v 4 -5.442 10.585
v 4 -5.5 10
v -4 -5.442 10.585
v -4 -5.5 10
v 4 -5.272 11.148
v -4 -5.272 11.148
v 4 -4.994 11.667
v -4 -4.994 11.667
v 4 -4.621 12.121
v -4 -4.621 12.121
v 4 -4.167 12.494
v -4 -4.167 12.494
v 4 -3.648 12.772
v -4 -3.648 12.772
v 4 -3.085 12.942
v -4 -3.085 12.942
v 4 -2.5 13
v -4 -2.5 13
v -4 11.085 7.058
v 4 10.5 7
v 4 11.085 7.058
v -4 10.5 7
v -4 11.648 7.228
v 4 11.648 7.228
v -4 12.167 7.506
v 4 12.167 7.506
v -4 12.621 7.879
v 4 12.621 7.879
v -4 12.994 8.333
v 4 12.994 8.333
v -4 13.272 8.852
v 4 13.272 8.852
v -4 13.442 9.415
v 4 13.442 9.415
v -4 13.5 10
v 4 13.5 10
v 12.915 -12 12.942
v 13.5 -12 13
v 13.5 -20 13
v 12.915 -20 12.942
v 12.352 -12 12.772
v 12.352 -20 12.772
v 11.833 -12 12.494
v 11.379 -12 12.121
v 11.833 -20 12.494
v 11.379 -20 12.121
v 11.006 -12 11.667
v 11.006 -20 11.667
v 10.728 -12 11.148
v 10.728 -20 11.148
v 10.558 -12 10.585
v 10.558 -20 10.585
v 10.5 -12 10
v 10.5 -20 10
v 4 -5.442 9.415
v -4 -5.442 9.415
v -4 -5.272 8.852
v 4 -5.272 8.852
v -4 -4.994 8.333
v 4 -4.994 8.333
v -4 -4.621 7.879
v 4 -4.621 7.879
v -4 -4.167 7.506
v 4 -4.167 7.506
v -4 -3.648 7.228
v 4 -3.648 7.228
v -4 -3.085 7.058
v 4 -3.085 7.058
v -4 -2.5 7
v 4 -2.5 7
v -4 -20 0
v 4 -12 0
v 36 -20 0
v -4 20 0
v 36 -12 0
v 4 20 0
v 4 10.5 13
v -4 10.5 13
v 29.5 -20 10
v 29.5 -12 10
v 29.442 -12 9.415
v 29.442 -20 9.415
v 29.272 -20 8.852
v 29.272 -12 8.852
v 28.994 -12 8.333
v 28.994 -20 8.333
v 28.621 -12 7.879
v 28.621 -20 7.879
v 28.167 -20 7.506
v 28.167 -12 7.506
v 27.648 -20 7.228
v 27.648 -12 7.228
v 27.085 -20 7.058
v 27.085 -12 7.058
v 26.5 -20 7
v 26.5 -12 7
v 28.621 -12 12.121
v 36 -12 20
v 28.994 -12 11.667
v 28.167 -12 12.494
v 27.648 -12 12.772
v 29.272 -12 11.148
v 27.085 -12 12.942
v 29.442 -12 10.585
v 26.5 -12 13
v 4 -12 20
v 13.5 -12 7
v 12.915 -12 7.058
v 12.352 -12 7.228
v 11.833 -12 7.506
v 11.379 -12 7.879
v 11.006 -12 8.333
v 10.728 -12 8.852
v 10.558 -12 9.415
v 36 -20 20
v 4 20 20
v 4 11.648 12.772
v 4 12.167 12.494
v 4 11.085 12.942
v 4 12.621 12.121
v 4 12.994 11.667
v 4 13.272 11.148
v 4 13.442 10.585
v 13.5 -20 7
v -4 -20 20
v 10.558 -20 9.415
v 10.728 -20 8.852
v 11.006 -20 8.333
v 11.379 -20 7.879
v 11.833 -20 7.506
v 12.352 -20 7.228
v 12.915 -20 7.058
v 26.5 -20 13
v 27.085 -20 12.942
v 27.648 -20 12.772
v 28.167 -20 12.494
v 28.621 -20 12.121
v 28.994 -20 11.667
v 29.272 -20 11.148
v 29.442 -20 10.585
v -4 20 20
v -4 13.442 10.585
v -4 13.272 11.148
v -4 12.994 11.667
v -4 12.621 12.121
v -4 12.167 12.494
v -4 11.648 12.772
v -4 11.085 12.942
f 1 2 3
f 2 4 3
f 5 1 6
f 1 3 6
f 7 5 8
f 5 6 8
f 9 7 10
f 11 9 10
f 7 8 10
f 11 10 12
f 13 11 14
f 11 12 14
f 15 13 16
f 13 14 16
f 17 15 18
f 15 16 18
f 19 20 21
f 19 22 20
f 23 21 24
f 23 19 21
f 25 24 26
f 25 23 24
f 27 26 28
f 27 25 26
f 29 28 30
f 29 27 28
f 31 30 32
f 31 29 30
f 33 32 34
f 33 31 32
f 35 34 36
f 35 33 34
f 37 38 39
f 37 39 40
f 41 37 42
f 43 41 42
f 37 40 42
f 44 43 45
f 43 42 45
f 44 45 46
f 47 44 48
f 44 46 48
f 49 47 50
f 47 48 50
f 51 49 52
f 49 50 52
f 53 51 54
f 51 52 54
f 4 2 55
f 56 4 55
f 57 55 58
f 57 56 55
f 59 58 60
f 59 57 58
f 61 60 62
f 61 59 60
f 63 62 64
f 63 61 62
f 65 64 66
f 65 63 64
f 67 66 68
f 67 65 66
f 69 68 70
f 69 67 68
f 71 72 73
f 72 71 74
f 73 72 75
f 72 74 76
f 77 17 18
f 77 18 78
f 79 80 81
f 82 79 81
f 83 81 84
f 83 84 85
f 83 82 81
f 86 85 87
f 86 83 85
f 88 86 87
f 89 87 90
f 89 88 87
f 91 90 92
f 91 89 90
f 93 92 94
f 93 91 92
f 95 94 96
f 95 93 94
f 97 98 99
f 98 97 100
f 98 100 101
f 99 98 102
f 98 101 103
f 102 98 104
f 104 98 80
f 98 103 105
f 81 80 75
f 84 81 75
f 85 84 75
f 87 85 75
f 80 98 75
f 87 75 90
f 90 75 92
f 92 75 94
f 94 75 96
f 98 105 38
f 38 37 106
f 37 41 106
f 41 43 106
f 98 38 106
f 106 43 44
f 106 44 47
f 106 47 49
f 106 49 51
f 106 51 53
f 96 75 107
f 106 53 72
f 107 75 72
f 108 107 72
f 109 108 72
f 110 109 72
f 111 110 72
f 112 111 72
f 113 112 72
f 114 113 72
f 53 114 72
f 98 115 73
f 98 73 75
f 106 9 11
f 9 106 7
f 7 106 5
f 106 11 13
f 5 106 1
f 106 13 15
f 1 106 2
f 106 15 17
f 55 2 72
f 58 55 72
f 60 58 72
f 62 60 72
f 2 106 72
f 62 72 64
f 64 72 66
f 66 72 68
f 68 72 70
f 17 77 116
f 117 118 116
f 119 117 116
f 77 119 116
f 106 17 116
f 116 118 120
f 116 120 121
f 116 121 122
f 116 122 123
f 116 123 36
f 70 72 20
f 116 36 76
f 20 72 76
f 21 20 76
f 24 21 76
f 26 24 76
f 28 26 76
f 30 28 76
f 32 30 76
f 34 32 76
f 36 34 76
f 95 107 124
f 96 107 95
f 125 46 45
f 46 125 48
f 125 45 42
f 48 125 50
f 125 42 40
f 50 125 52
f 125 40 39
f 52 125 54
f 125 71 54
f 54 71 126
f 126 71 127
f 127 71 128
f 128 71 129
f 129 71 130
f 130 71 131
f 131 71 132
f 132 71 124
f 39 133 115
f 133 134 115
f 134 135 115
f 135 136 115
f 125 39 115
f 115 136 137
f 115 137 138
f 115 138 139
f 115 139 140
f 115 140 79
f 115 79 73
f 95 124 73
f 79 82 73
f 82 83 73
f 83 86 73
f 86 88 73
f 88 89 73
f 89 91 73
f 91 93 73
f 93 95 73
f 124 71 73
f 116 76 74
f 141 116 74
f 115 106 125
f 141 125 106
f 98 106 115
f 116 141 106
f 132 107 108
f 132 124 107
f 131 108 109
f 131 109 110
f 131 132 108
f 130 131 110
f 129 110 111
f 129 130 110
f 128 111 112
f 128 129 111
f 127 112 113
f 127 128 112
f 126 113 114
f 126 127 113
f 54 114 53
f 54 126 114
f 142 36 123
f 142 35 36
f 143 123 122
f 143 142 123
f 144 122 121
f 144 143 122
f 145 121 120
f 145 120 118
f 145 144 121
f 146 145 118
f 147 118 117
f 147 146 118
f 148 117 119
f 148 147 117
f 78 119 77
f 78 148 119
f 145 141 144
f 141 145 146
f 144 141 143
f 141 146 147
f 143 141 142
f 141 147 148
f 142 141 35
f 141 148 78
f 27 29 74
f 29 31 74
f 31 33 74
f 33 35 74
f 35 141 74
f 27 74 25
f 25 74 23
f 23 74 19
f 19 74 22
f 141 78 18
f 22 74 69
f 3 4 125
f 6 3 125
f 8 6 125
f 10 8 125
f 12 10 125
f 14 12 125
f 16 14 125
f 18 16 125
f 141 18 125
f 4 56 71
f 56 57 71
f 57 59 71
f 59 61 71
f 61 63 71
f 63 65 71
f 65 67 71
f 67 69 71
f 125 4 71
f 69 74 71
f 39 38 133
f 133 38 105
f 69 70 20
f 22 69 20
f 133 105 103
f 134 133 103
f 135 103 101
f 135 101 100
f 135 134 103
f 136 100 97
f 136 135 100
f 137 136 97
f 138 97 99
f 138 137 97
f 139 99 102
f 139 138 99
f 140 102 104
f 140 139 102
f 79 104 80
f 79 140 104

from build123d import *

# Parameters (mm, degrees)
BOSS_EXTRUDE1_DEPTH = 20
SKETCH2_W           = 19
SKETCH2_H           = 6
CUT_EXTRUDE1_DEPTH  = 20
SKETCH3_W           = 6
SKETCH3_H           = 19
CUT_EXTRUDE2_DEPTH  = 20
FILLET1_R           = 3


with BuildPart() as part:
    # Sketch1 → Boss-Extrude1 (new body)
    with BuildSketch(Plane.XY):
        Polygon((4, -20), (36, -20), (36, -12), (4, -12), (4, 20), (-4, 20), (-4, -20), align=None)
    extrude(amount=BOSS_EXTRUDE1_DEPTH)

    # Sketch2 → Cut-Extrude1 (cut)
    with BuildSketch(Plane(origin=(0, -12, 0), x_dir=(1, 0, 0), z_dir=(0, 1, 0))):
        with Locations((20, -10)):
            Rectangle(SKETCH2_W, SKETCH2_H)
    extrude(amount=-CUT_EXTRUDE1_DEPTH, mode=Mode.SUBTRACT)

    # Sketch3 → Cut-Extrude2 (cut)
    with BuildSketch(Plane(origin=(4, 0, 0), x_dir=(0, 0, -1), z_dir=(1, 0, 0))):
        with Locations((-10, 4)):
            Rectangle(SKETCH3_W, SKETCH3_H)
    extrude(amount=-CUT_EXTRUDE2_DEPTH, mode=Mode.SUBTRACT)

    # Fillet1
    fillet1_edges = [part.edges().sort_by_distance(p)[0] for p in [
        (29.5, -16, 7),
        (29.5, -16, 13),
        (10.5, -16, 7),
        (10.5, -16, 13),
        (0, -5.5, 13),
        (0, -5.5, 7),
        (0, 13.5, 13),
        (0, 13.5, 7),
    ]]
    fillet(fillet1_edges, radius=FILLET1_R - 0.0001)  # a hair under: the kernel refuses the full size


solid = part.part
